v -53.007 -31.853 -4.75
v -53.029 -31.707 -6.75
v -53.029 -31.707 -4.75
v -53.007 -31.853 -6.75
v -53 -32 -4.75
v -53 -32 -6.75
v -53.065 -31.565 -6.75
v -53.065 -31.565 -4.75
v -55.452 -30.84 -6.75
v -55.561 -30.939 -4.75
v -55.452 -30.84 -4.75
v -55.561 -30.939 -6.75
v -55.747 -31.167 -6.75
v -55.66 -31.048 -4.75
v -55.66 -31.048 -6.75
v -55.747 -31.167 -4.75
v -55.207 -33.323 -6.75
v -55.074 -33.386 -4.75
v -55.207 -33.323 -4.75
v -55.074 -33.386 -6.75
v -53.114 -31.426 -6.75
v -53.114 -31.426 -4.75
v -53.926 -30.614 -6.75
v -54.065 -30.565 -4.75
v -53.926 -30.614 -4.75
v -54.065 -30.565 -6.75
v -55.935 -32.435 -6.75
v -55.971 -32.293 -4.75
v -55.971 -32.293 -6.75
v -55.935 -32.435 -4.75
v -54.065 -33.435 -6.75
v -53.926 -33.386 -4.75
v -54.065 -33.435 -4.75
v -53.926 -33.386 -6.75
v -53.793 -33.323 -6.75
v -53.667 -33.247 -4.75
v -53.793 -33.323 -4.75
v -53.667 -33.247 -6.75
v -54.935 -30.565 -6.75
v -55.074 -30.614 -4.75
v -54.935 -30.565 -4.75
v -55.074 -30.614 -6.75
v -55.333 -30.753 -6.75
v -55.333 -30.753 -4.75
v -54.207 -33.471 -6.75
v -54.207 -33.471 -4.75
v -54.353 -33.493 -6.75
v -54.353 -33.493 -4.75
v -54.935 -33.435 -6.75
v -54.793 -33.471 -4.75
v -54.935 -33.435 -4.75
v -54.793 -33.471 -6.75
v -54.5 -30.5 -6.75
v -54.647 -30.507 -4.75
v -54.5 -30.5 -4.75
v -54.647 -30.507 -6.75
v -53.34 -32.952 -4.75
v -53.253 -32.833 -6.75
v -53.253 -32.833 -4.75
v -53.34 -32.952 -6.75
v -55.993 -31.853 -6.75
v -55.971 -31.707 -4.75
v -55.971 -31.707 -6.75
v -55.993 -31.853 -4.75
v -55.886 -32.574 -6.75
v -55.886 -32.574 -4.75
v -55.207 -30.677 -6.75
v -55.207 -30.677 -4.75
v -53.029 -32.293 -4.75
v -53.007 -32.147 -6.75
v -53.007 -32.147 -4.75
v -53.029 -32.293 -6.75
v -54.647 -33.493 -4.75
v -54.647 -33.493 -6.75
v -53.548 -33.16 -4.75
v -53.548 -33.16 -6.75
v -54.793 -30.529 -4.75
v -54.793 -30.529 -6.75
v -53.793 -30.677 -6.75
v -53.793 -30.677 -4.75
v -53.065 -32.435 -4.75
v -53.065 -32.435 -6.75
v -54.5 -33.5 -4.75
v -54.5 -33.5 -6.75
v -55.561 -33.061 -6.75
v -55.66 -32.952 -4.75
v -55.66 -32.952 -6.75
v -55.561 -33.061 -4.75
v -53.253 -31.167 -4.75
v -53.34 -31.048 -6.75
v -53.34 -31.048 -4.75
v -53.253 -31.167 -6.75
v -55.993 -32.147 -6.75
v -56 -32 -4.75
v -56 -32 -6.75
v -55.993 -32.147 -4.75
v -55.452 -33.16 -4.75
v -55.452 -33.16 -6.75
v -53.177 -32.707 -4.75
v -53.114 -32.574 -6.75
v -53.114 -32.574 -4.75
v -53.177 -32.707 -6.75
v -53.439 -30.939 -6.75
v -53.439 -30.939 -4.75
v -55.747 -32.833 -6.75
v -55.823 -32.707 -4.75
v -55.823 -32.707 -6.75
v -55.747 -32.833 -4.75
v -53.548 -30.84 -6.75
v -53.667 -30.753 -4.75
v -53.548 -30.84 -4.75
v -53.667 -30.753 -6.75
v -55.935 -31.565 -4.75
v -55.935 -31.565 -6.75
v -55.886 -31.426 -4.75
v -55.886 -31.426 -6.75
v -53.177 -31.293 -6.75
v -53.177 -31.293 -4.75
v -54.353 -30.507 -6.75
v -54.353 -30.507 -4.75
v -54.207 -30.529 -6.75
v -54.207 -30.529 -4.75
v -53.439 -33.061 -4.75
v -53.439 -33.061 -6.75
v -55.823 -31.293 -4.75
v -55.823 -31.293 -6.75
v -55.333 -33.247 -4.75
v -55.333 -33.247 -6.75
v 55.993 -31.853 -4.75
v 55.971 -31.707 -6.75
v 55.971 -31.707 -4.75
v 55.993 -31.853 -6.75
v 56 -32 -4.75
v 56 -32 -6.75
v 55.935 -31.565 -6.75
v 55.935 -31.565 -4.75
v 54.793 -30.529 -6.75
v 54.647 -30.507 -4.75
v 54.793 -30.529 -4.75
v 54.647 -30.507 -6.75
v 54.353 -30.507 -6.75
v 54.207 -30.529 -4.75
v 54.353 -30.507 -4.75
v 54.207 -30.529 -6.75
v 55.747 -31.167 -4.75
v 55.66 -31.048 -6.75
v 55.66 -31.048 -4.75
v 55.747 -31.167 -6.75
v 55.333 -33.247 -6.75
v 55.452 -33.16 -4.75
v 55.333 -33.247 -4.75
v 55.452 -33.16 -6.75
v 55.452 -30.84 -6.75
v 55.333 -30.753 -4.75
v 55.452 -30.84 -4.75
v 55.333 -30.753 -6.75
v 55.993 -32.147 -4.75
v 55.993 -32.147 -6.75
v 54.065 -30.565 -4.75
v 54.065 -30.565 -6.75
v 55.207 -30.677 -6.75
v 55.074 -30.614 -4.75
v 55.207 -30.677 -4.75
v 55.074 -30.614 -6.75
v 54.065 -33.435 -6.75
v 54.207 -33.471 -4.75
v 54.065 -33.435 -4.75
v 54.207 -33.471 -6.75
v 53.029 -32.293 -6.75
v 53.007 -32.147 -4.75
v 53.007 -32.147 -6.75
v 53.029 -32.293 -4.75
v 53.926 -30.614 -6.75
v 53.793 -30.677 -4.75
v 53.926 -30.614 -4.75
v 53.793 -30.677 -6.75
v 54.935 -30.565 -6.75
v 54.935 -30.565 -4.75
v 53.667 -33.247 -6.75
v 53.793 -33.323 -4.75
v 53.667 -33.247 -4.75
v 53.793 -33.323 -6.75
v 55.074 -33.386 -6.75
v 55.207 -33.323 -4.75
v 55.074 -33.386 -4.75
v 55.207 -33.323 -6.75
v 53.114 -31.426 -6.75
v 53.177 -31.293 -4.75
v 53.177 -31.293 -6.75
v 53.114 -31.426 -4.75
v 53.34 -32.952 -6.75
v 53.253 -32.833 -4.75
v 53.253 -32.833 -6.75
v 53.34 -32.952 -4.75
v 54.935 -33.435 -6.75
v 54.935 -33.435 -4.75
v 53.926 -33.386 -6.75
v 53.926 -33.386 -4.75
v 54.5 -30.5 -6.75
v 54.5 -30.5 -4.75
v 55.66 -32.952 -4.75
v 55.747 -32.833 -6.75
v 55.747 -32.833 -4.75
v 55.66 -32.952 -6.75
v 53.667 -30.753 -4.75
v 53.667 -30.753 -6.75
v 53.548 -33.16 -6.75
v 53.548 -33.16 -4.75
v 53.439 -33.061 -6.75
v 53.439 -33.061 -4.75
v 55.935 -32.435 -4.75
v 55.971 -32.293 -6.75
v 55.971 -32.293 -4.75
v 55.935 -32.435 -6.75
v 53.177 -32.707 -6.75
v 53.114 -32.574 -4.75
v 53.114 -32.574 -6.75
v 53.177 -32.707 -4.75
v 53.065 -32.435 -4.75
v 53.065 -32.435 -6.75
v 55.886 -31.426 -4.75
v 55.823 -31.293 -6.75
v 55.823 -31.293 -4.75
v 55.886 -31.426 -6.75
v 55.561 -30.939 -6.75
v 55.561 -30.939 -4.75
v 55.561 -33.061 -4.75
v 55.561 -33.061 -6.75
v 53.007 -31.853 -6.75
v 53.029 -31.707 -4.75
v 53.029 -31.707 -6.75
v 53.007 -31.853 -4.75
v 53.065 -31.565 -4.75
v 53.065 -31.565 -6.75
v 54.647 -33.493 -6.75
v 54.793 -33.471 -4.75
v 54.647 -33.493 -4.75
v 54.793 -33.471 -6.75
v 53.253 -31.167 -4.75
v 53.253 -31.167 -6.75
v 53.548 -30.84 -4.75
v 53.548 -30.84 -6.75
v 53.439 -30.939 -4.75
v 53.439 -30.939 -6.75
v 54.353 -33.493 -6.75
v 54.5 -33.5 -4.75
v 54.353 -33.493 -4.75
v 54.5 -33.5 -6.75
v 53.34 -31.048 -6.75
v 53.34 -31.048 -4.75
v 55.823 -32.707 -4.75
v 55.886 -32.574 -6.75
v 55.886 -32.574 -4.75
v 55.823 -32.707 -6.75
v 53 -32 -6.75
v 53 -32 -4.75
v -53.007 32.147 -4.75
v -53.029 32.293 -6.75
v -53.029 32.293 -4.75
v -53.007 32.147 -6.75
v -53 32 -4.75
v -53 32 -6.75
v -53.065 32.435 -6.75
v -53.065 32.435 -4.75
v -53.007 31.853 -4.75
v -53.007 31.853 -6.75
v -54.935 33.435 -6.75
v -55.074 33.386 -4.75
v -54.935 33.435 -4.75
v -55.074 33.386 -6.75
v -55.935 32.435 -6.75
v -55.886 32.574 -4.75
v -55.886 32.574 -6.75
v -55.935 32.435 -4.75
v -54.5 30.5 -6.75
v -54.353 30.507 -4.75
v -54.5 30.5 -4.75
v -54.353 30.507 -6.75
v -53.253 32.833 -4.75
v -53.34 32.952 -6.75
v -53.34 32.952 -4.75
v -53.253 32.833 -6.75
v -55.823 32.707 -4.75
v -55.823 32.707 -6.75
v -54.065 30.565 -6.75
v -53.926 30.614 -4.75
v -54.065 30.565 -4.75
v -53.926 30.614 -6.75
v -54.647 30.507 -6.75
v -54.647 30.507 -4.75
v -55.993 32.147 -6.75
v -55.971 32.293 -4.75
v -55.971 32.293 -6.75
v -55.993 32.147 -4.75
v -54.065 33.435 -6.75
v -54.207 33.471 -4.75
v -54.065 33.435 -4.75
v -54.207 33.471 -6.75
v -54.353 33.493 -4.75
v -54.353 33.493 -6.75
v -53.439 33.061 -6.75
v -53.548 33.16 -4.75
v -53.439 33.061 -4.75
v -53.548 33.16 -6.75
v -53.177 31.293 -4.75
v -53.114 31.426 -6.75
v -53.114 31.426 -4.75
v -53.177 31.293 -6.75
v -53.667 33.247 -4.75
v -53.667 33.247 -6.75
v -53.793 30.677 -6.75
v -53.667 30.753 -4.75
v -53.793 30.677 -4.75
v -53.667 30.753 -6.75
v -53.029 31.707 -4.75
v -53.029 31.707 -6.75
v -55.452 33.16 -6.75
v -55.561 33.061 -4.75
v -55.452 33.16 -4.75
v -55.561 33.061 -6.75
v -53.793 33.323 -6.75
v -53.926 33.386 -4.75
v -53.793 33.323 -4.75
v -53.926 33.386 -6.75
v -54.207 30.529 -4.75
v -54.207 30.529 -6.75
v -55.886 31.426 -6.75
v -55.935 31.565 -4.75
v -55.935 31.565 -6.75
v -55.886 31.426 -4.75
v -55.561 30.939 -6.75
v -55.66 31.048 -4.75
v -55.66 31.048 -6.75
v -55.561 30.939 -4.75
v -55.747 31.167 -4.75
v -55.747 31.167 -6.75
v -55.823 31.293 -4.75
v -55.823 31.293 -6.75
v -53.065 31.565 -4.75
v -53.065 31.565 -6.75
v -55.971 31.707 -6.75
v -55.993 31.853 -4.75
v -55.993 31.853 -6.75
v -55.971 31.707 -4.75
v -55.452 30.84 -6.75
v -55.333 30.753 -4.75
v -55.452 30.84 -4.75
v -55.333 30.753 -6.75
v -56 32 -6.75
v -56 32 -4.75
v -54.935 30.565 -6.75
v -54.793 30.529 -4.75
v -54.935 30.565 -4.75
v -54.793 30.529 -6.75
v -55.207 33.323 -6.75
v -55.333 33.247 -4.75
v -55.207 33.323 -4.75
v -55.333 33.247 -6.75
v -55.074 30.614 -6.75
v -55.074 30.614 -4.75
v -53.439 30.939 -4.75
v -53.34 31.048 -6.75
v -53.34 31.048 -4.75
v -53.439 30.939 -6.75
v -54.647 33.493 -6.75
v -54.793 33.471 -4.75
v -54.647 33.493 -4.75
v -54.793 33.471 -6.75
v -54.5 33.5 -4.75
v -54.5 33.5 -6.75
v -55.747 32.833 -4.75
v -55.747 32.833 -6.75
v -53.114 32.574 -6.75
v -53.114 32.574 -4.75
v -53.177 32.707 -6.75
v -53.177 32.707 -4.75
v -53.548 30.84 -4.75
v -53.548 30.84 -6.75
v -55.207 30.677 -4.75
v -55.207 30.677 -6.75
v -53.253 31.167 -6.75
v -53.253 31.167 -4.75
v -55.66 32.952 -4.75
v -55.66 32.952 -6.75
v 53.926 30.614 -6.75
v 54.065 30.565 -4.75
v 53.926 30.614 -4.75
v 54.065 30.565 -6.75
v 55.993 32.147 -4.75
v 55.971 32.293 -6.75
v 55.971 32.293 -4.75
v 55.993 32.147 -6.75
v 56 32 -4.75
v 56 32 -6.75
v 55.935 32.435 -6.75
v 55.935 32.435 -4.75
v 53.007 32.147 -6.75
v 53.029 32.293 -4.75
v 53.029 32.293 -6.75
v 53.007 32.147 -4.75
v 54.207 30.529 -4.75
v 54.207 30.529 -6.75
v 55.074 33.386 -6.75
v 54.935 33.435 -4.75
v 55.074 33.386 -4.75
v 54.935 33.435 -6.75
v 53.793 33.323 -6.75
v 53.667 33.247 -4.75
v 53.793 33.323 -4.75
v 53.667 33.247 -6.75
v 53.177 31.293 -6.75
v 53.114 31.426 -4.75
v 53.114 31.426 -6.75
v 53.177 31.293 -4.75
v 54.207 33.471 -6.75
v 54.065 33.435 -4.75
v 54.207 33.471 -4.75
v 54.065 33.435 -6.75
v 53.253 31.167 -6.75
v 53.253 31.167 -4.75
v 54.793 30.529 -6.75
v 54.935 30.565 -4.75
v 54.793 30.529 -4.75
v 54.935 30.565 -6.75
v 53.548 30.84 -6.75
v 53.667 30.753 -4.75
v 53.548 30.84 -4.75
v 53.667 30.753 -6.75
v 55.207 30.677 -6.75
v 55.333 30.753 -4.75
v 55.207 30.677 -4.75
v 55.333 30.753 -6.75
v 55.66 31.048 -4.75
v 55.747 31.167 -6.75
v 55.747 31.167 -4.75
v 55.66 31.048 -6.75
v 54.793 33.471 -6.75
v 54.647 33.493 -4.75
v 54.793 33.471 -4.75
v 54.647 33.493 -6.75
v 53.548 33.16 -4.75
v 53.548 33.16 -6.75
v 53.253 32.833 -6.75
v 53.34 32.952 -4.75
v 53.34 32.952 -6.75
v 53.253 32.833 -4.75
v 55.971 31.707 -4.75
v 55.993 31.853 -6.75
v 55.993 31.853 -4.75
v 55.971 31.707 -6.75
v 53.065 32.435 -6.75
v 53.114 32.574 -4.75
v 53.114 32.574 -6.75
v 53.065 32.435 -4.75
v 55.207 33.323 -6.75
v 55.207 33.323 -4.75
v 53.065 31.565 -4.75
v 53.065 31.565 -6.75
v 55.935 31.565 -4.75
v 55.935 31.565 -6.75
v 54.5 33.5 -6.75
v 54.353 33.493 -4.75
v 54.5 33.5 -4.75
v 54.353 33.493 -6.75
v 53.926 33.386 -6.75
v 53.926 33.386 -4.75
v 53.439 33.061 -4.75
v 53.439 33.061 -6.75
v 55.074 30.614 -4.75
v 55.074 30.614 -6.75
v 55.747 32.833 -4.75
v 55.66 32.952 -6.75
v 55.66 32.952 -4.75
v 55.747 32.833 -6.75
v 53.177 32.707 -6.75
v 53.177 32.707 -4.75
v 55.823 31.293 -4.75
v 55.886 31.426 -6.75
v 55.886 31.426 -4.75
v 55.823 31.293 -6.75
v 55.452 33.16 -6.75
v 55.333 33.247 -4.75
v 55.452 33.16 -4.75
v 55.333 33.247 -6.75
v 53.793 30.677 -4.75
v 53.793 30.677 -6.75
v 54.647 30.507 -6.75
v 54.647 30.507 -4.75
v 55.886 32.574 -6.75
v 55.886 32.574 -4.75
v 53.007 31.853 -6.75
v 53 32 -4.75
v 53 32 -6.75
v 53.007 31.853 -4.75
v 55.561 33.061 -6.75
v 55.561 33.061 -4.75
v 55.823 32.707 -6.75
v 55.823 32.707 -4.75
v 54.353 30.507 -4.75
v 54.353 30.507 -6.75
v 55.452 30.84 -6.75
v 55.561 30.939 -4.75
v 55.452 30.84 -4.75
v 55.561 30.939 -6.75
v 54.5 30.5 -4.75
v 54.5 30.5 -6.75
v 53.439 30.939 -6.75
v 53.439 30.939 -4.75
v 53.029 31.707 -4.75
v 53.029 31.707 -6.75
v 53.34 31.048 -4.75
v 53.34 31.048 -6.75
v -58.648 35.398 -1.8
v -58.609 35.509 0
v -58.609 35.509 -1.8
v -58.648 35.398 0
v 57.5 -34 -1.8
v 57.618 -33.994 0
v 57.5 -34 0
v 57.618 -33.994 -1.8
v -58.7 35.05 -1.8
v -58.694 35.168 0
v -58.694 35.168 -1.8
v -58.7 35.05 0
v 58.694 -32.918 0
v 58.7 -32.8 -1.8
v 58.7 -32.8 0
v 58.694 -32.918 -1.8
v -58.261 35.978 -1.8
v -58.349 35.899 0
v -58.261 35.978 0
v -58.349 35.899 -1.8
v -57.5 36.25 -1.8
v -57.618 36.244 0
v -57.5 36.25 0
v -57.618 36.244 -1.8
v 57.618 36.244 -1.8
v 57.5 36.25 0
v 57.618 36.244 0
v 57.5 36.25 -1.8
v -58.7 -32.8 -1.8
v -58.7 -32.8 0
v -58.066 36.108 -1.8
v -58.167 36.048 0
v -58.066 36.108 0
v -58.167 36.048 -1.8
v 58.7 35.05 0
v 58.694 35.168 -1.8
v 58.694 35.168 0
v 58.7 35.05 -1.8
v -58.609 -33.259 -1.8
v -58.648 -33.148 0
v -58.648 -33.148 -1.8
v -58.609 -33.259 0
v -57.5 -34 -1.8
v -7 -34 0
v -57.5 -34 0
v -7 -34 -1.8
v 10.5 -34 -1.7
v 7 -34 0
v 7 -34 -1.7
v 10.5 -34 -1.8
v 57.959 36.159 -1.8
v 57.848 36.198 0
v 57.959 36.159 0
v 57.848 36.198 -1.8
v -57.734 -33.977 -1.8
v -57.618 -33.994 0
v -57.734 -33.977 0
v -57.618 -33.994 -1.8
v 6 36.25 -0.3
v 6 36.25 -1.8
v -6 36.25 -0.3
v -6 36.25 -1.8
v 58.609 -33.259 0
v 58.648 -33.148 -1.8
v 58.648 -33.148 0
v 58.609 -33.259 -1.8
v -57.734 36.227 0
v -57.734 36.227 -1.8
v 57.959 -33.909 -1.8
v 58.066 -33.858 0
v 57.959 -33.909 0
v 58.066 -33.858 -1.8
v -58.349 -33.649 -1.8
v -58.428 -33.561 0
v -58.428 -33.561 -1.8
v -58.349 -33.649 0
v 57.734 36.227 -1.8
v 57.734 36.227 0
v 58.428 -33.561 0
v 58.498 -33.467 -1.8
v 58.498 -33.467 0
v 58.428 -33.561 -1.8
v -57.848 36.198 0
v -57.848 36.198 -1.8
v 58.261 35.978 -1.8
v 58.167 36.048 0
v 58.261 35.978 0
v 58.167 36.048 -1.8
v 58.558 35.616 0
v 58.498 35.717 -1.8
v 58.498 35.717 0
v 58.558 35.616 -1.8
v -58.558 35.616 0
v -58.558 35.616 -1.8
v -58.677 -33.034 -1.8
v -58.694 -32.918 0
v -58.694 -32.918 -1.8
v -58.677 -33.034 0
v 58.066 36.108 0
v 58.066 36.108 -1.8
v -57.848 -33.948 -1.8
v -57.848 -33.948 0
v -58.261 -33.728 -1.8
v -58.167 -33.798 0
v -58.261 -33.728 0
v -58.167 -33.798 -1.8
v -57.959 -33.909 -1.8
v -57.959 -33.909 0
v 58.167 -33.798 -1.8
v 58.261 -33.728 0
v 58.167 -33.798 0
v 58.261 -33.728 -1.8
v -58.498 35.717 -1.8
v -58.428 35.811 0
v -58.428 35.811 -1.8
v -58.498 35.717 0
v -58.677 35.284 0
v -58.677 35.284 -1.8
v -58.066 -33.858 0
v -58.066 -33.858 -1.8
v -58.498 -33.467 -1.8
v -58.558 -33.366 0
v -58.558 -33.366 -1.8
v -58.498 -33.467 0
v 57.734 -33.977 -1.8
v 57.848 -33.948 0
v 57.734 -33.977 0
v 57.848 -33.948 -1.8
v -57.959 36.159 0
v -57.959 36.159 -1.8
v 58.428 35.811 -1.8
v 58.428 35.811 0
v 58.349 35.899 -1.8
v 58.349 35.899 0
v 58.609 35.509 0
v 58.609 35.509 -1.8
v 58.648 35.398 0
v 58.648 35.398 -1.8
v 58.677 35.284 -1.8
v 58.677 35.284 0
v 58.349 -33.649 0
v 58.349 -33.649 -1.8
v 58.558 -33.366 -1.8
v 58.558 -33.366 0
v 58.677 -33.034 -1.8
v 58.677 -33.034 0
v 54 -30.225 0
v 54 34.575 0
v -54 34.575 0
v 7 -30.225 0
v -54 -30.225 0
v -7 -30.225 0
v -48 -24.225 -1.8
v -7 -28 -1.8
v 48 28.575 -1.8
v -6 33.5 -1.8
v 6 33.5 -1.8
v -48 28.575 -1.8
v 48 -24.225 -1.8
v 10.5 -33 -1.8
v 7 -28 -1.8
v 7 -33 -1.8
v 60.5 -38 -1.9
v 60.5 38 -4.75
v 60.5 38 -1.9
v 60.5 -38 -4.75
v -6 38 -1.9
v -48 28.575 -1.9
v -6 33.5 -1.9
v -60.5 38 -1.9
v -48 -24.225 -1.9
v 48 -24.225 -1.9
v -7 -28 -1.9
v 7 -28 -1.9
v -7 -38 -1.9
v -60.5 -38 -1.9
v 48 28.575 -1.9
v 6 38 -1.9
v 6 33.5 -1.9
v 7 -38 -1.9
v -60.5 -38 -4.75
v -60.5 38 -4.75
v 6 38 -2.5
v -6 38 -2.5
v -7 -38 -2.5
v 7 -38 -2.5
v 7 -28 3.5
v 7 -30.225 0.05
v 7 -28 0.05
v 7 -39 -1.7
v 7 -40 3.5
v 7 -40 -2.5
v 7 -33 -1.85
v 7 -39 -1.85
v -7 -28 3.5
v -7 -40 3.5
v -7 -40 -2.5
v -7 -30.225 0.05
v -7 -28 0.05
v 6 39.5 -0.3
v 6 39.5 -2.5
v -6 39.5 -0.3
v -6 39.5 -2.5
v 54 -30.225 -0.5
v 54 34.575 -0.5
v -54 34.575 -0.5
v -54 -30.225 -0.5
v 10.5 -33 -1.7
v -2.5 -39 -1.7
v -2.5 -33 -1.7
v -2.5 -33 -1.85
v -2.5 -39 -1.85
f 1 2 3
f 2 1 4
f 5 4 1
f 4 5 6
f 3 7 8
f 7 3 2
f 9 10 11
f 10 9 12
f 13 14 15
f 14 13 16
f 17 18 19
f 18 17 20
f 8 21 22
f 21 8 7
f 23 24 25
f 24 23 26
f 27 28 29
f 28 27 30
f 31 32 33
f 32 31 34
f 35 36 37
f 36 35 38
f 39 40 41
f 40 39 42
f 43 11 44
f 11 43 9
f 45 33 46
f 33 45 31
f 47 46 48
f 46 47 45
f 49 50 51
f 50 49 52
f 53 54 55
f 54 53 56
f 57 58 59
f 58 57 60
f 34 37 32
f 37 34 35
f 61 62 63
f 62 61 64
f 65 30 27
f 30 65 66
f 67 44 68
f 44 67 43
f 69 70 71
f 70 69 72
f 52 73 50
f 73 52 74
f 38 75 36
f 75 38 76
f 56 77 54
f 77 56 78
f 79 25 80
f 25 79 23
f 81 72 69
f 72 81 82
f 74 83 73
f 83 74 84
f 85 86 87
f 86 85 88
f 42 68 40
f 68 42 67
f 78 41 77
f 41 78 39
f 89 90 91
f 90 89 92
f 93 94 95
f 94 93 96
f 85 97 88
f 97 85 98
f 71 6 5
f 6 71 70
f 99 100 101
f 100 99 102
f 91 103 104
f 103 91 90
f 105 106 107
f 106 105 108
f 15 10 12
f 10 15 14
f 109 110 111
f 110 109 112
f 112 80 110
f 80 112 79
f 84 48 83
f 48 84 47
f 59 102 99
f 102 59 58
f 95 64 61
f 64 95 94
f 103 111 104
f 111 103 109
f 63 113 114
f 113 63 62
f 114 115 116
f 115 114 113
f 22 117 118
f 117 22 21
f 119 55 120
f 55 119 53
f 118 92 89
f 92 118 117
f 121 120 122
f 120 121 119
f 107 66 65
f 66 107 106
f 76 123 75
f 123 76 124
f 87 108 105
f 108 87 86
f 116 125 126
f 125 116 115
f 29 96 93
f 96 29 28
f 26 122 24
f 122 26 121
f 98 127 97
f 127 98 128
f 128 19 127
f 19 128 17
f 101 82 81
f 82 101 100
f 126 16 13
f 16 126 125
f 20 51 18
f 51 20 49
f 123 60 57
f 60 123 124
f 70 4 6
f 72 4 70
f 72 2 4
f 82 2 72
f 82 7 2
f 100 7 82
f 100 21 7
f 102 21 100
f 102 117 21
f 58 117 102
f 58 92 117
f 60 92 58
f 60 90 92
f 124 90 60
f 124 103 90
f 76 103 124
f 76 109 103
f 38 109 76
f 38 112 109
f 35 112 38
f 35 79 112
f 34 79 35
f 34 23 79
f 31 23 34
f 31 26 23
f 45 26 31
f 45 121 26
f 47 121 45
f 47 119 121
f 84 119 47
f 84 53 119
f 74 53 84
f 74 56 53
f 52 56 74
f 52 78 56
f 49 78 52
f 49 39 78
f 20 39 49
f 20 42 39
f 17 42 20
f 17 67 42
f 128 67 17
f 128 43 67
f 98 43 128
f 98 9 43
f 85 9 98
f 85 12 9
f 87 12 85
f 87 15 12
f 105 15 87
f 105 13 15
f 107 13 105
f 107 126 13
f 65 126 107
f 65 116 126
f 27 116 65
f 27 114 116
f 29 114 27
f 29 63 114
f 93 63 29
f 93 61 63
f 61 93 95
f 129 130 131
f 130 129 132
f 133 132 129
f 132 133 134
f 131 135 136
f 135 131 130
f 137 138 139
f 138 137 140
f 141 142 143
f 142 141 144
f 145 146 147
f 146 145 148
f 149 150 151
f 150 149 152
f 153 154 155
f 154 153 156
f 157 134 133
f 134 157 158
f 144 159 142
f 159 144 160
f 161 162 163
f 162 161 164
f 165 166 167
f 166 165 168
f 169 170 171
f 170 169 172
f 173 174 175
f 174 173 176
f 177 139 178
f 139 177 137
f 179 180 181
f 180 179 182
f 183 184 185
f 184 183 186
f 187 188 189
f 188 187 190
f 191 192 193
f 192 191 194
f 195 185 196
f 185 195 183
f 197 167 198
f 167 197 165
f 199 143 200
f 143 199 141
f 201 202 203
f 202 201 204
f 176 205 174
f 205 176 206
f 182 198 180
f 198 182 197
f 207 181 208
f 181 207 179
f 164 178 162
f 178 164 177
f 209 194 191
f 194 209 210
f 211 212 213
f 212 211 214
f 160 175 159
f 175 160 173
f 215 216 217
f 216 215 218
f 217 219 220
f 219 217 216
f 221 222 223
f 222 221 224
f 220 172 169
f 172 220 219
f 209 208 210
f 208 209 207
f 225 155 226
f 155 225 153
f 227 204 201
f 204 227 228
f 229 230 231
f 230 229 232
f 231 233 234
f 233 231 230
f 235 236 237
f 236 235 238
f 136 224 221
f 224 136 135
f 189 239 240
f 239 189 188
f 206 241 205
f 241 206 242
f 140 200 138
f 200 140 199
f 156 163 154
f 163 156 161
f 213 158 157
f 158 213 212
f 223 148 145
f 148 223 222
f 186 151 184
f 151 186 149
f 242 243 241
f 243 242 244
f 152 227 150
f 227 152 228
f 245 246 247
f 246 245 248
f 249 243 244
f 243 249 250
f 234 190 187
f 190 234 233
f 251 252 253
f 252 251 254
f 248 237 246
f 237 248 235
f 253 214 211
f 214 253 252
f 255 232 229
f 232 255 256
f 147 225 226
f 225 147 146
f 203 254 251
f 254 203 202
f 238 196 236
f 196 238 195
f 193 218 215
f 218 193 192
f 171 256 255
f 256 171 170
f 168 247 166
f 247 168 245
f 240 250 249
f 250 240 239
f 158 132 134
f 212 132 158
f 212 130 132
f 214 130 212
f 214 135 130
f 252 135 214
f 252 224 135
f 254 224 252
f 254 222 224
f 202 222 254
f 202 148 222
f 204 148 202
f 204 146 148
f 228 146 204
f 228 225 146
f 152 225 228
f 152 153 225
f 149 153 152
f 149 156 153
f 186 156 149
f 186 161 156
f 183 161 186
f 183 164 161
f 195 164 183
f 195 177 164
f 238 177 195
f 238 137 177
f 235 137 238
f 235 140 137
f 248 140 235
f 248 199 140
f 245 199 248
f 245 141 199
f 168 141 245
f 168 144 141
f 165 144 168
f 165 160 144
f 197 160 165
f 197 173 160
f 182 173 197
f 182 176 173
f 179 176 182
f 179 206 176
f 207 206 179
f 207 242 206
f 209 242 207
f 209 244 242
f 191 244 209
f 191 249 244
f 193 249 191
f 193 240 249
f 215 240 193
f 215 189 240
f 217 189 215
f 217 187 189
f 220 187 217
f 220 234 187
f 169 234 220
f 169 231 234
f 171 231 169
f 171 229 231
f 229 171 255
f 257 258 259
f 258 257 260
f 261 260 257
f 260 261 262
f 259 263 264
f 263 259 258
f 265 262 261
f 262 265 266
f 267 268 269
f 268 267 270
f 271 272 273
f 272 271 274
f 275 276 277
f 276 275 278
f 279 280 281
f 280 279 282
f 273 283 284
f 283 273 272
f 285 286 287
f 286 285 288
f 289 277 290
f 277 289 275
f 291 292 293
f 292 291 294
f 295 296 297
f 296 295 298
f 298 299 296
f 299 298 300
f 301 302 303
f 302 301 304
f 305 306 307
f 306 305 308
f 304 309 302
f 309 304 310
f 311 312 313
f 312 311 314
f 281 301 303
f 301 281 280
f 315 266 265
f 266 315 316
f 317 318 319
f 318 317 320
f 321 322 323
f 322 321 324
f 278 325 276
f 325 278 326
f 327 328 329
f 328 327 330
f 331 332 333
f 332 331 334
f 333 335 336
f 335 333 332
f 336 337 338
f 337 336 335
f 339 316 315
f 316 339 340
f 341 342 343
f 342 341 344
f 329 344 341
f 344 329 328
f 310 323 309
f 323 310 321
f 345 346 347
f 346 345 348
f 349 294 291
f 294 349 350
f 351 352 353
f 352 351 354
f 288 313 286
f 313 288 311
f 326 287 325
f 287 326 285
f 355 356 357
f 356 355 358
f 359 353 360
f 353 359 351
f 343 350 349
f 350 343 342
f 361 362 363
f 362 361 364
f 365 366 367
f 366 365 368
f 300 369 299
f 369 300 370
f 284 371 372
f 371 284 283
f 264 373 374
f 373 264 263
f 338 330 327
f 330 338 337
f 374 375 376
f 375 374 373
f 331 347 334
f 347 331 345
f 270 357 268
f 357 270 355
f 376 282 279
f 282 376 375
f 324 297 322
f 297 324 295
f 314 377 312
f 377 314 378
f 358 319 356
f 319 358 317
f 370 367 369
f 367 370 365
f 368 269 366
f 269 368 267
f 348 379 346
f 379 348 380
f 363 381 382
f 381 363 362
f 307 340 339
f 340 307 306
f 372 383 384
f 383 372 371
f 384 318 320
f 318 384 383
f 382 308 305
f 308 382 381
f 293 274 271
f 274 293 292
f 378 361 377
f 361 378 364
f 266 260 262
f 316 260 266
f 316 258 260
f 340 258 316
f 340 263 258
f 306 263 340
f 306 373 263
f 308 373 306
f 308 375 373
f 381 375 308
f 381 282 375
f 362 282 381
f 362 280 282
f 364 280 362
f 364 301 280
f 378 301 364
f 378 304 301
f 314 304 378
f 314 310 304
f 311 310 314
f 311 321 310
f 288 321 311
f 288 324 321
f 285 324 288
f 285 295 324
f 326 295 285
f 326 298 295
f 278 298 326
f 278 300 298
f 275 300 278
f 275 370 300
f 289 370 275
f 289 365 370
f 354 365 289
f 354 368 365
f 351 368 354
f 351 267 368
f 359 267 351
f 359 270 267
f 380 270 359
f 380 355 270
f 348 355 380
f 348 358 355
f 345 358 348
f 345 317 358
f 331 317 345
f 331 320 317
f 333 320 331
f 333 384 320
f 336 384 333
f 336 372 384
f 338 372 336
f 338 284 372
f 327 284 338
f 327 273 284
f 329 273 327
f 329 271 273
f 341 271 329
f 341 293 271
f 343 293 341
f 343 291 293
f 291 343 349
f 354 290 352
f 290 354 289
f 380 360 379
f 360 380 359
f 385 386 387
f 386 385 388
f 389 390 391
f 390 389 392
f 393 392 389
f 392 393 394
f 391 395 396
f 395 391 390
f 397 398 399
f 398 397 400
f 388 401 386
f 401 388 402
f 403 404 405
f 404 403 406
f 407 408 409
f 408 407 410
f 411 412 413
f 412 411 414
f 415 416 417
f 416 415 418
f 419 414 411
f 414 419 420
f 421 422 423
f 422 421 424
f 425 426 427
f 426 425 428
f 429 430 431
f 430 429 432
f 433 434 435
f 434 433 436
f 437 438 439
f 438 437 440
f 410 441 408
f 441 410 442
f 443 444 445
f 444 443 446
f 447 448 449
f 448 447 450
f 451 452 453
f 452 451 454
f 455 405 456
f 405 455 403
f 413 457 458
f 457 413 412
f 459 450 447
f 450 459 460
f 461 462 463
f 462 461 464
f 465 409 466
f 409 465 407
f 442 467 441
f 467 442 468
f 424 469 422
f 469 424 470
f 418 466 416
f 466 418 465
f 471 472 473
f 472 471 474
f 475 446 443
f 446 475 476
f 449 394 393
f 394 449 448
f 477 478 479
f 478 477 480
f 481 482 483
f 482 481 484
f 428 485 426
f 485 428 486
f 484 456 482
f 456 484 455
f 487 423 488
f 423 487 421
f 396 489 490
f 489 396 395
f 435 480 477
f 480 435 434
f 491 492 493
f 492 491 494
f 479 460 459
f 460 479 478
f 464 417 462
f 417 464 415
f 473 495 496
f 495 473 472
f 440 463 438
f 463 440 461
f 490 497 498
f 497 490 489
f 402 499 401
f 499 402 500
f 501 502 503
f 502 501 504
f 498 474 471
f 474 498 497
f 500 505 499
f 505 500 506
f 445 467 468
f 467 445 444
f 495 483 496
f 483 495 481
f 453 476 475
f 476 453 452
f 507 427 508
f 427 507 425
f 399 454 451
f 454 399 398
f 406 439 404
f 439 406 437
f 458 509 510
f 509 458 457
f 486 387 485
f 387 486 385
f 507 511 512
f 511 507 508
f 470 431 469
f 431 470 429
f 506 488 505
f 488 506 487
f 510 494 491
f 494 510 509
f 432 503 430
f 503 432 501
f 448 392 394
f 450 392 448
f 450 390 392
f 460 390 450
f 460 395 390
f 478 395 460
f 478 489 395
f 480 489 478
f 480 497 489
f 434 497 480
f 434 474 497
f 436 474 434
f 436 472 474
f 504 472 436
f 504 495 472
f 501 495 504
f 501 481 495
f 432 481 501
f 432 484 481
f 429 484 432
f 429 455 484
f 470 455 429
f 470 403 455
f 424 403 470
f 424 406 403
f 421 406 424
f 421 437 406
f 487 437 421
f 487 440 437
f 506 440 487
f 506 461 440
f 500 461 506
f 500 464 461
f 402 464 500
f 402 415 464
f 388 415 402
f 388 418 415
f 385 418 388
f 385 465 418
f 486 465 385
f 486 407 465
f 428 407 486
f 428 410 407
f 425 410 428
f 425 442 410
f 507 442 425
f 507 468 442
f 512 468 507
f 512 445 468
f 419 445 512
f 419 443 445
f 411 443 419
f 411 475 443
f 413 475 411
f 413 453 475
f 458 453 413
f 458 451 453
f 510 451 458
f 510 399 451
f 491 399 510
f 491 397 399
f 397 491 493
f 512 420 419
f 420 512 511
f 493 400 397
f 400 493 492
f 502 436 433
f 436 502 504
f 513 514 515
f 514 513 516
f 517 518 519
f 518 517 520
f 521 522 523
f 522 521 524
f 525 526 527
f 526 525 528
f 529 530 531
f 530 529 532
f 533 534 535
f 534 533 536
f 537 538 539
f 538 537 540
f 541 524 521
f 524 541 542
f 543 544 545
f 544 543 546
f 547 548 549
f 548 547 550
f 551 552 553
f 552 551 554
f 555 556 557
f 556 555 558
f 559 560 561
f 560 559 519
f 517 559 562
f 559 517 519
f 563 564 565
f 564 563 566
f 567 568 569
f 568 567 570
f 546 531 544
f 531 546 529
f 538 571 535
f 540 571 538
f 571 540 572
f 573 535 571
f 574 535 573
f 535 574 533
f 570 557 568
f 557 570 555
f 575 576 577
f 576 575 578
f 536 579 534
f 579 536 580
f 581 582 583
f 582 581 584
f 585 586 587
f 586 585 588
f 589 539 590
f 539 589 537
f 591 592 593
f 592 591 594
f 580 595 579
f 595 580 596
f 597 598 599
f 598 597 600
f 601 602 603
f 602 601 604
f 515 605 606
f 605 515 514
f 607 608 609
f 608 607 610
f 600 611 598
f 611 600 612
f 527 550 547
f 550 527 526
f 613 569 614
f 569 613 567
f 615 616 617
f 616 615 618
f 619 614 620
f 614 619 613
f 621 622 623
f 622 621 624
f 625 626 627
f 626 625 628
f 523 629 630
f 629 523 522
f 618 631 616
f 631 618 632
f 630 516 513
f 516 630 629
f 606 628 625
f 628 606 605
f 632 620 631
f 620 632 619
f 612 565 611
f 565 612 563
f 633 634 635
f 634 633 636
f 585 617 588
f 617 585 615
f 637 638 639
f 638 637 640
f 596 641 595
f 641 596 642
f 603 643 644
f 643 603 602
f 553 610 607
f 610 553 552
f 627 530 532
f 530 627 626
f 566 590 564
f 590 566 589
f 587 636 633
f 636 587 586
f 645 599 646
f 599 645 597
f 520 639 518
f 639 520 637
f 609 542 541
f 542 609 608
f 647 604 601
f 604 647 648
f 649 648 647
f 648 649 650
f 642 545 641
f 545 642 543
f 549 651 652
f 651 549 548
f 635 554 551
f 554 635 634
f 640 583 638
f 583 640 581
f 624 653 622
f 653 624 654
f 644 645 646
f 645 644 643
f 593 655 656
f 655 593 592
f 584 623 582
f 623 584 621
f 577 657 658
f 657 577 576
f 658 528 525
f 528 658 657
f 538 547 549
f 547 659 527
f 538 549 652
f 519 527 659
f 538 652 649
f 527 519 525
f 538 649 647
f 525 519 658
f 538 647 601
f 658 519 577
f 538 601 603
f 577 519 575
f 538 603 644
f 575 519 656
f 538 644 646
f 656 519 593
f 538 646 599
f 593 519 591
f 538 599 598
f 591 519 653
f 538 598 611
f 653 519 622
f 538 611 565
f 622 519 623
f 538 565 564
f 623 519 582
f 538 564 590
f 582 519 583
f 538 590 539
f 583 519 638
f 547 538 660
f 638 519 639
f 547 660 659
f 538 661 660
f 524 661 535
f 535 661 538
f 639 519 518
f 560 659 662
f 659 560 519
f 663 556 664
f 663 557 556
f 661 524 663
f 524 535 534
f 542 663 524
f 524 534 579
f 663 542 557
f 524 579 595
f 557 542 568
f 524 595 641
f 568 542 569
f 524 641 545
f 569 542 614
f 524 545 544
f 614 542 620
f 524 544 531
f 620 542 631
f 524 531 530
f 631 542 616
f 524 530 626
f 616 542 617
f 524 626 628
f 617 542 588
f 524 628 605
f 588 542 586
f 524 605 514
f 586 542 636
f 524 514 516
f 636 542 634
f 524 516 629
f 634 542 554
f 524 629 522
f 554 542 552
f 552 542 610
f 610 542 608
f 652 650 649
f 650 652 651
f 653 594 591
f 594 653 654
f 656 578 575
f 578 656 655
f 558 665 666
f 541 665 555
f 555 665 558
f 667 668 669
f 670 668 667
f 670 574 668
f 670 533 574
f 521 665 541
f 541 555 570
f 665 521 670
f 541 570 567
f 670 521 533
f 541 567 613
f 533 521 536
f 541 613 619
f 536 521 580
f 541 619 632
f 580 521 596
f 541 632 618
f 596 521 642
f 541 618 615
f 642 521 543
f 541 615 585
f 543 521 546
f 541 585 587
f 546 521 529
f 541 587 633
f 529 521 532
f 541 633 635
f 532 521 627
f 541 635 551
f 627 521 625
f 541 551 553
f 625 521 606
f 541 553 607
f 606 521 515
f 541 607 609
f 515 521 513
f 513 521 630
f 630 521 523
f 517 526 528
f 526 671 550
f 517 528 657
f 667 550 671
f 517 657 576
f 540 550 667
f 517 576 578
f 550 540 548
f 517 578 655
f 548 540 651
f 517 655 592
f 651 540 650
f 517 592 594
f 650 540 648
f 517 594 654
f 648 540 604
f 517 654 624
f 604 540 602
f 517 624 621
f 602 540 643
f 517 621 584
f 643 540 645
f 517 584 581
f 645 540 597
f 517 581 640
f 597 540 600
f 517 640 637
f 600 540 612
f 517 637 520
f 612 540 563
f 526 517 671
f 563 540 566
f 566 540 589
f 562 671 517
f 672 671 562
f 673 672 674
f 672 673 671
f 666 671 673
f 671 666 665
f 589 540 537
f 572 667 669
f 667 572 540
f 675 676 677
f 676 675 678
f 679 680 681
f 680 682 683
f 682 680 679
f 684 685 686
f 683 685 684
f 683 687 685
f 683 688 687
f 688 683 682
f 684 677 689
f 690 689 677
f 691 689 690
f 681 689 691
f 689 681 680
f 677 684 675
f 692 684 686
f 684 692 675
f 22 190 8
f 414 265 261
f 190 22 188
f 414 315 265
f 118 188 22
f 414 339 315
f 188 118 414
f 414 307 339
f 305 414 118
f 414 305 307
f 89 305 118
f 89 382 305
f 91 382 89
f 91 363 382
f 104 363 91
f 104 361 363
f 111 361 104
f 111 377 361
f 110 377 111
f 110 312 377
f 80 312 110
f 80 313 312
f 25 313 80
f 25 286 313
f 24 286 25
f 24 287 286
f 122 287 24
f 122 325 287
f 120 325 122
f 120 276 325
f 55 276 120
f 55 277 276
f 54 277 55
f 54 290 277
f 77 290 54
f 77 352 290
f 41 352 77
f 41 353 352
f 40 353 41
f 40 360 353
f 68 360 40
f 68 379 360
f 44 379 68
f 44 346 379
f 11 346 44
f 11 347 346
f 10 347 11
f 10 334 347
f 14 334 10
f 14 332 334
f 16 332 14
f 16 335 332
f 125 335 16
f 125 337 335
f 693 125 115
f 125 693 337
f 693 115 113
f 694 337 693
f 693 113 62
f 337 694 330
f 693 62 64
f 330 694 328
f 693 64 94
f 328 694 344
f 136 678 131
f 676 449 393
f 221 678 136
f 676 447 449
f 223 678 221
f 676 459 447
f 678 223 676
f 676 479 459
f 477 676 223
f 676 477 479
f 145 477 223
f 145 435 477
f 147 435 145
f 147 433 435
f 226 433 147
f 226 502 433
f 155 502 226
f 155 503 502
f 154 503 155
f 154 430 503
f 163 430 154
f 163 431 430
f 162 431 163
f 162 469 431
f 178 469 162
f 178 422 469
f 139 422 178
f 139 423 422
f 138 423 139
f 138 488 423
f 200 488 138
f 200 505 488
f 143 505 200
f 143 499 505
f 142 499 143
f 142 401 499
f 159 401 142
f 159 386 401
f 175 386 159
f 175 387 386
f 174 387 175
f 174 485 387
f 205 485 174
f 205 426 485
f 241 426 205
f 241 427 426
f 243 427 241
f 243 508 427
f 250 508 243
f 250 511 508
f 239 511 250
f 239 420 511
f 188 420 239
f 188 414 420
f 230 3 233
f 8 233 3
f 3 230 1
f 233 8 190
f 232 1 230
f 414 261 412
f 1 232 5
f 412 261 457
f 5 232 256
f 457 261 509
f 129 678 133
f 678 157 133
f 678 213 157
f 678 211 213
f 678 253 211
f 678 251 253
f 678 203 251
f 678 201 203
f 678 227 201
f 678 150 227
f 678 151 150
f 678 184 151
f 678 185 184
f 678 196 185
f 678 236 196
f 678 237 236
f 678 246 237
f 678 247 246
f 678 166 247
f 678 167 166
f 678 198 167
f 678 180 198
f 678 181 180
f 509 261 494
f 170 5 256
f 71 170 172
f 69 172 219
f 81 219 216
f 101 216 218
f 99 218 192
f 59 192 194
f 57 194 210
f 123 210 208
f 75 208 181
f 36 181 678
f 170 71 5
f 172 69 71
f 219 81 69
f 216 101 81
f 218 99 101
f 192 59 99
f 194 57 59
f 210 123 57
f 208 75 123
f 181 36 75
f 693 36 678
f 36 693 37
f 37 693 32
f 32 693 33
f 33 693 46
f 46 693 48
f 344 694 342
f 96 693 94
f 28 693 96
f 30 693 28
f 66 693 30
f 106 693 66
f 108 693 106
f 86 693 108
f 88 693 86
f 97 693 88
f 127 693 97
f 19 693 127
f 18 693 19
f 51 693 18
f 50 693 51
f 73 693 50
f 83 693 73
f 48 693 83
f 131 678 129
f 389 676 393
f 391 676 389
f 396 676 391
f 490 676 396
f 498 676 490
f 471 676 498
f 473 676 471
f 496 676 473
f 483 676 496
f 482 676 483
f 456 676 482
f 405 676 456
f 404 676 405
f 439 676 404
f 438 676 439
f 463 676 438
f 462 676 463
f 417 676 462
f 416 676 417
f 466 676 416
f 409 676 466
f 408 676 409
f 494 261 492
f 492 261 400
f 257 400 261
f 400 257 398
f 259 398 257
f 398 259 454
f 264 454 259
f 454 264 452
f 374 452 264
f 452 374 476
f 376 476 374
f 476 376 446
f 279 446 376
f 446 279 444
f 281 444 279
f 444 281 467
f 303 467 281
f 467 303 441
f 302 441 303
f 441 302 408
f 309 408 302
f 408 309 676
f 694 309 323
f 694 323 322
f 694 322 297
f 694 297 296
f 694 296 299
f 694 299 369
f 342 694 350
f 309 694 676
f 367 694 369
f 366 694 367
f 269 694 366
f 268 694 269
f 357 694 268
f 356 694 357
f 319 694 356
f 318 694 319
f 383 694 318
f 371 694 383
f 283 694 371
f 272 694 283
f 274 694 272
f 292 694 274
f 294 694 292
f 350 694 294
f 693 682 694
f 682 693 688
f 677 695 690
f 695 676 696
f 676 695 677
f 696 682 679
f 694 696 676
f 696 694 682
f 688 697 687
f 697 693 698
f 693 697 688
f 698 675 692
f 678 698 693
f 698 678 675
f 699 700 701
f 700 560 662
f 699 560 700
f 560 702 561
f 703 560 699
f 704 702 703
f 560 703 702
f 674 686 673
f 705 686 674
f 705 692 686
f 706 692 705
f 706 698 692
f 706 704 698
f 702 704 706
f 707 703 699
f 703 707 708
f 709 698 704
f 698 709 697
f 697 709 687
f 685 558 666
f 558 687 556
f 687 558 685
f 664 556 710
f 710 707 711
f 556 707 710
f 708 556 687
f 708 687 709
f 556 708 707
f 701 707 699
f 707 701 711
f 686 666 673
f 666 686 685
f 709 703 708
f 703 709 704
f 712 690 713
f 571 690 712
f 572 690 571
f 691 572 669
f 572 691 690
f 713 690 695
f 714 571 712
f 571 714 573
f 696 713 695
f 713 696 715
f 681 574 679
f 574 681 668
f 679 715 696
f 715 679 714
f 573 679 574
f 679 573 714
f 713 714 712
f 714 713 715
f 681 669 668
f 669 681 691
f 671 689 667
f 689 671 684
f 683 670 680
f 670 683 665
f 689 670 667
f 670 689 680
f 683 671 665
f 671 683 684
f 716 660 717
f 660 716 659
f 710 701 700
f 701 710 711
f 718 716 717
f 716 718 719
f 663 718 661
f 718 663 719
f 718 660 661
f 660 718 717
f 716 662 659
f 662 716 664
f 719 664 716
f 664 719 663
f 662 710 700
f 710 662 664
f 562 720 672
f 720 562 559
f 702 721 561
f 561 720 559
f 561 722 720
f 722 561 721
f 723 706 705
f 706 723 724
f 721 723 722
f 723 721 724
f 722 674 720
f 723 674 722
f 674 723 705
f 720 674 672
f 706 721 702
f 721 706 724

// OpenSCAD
$fn = 64;

eps = 0.05;

// ===== Spec =====
// HDMI display 5" module
pcb_size   = [121, 76, 2.85];
pcb_offset = [0, 0, 1.9];                 // pcb offset from front reference (z=0 at front glass top)

// Aperture (window) in front layer
ap_min   = [-54, -30.225];
ap_max   = [ 54,  34.575];
ap_depth = 0.5;

// Touch screen glass extents
ts_min = [-58.7, -34];
ts_max = [ 58.7,  36.25];
ts_th  = 1.0;

// Touchscreen ribbon clearance (needs clearance below glass)
rib_min = [-2.5, -39];
rib_max = [10.5, -33];

// Thread length (standoff length below PCB)
thread_len = 2;
thread_d   = 3.0;

// Simple connector bumps (kept connected to PCB)
hdmi_body     = [14, 12, 6];  // [x,y,z]
hdmi_overhang = 2;            // protrude beyond PCB edge in -Y

fpc_body      = [12, 6, 2.2]; // small ribbon/FPC connector bump
fpc_overhang  = 1.5;          // protrude beyond PCB edge in +Y

// ===== Helpers =====
module rect_prism_xy(minxy, maxxy, z0, z1) {
    translate([(minxy[0]+maxxy[0])/2, (minxy[1]+maxxy[1])/2, (z0+z1)/2])
        cube([maxxy[0]-minxy[0], maxxy[1]-minxy[1], z1-z0], center=true);
}

module rounded_rect_prism_xy(minxy, maxxy, z0, z1, r=1.5) {
    // 2D rounded rectangle extruded between z0..z1
    w = maxxy[0]-minxy[0];
    h = maxxy[1]-minxy[1];
    cx = (minxy[0]+maxxy[0])/2;
    cy = (minxy[1]+maxxy[1])/2;
    translate([cx, cy, z0])
        linear_extrude(height = (z1-z0))
            offset(r=r)
                square([w-2*r, h-2*r], center=true);
}

// ===== Main model (ONE connected solid) =====
module hdmi_display_5in() {

    // Z layout (front reference plane at z=0 is top of touch glass)
    ts_z0 = -ts_th;
    ts_z1 = 0;

    pcb_cz = -(pcb_offset[2] + pcb_size[2]/2);
    pcb_z0 = pcb_cz - pcb_size[2]/2;
    pcb_z1 = pcb_cz + pcb_size[2]/2;

    // A thin bezel/frame thickness behind glass to make aperture meaningful
    bezel_th = 0.8;
    bezel_z0 = ts_z0 - bezel_th;
    bezel_z1 = ts_z0 + 0.15; // slight overlap into glass for robust union

    // Standoffs connect from PCB bottom down by thread_len, overlap into PCB
    st_z0 = pcb_z0 - thread_len;
    st_z1 = pcb_z0 + 0.6;

    // Mounting standoff positions (near corners, inset)
    inset_x = 6;
    inset_y = 6;
    st_pos = [
        [-pcb_size[0]/2 + inset_x, -pcb_size[1]/2 + inset_y],
        [ pcb_size[0]/2 - inset_x, -pcb_size[1]/2 + inset_y],
        [-pcb_size[0]/2 + inset_x,  pcb_size[1]/2 - inset_y],
        [ pcb_size[0]/2 - inset_x,  pcb_size[1]/2 - inset_y]
    ];

    // HDMI connector placement: on -Y edge, sitting on PCB top, overlapping into PCB
    hdmi_cx = 0;
    hdmi_cy = -pcb_size[1]/2 - hdmi_overhang + hdmi_body[1]/2;
    hdmi_cz = pcb_z1 + hdmi_body[2]/2 - 0.6;

    // FPC connector placement: on +Y edge, sitting on PCB top, overlapping into PCB
    fpc_cx = 0;
    fpc_cy = pcb_size[1]/2 + fpc_overhang - fpc_body[1]/2;
    fpc_cz = pcb_z1 + fpc_body[2]/2 - 0.6;

    // Bridge/web to ensure glass/bezel/pcb are one connected solid (under bezel area)
    // Connects from PCB top up into bezel region with overlap.
    web_th = 0.9;
    web_z0 = pcb_z1 - web_th;     // overlaps into PCB
    web_z1 = bezel_z0 + web_th;   // overlaps into bezel
    web_min = [ap_min[0] + 6, ap_min[1] + 6];
    web_max = [ap_max[0] - 6, ap_max[1] - 6];

    // Bezel outer follows touch glass extents; inner is aperture
    bezel_outer_min = ts_min;
    bezel_outer_max = ts_max;

    difference() {
        union() {
            // Touch glass (front layer)
            rounded_rect_prism_xy(ts_min, ts_max, ts_z0, ts_z1, r=1.2);

            // Bezel/frame layer behind glass (gives a real aperture cut)
            rounded_rect_prism_xy(bezel_outer_min, bezel_outer_max, bezel_z0, bezel_z1, r=1.2);

            // PCB (behind glass)
            translate([pcb_offset[0], pcb_offset[1], pcb_cz])
                cube(pcb_size, center=true);

            // Mounting standoffs (solid cylinders) connected to PCB
            for (p = st_pos)
                translate([p[0], p[1], (st_z0+st_z1)/2])
                    cylinder(h = (st_z1-st_z0), d = thread_d, center=true);

            // HDMI connector bump (solid) connected to PCB
            translate([hdmi_cx, hdmi_cy, hdmi_cz])
                cube(hdmi_body, center=true);

            // FPC/ribbon connector bump (solid) connected to PCB
            translate([fpc_cx, fpc_cy, fpc_cz])
                cube(fpc_body, center=true);

            // Web/bridge to guarantee single connected solid (glass/bezel <-> PCB)
            rect_prism_xy(web_min, web_max, web_z0, web_z1);
        }

        // Aperture cut (window) through glass + bezel depth from front
        // Cut from z=-ap_depth to slightly above front to ensure clean opening.
        rect_prism_xy(ap_min, ap_max, -ap_depth, eps);

        // Touchscreen ribbon clearance cut (through glass+bezel region)
        // Provide clearance down to PCB top (but not through PCB).
        rib_z0 = bezel_z0 - eps;
        rib_z1 = pcb_z1 + 0.2; // stop near PCB top; still clears glass/bezel volume
        rect_prism_xy(rib_min, rib_max, rib_z0, rib_z1);
    }
}

hdmi_display_5in();
